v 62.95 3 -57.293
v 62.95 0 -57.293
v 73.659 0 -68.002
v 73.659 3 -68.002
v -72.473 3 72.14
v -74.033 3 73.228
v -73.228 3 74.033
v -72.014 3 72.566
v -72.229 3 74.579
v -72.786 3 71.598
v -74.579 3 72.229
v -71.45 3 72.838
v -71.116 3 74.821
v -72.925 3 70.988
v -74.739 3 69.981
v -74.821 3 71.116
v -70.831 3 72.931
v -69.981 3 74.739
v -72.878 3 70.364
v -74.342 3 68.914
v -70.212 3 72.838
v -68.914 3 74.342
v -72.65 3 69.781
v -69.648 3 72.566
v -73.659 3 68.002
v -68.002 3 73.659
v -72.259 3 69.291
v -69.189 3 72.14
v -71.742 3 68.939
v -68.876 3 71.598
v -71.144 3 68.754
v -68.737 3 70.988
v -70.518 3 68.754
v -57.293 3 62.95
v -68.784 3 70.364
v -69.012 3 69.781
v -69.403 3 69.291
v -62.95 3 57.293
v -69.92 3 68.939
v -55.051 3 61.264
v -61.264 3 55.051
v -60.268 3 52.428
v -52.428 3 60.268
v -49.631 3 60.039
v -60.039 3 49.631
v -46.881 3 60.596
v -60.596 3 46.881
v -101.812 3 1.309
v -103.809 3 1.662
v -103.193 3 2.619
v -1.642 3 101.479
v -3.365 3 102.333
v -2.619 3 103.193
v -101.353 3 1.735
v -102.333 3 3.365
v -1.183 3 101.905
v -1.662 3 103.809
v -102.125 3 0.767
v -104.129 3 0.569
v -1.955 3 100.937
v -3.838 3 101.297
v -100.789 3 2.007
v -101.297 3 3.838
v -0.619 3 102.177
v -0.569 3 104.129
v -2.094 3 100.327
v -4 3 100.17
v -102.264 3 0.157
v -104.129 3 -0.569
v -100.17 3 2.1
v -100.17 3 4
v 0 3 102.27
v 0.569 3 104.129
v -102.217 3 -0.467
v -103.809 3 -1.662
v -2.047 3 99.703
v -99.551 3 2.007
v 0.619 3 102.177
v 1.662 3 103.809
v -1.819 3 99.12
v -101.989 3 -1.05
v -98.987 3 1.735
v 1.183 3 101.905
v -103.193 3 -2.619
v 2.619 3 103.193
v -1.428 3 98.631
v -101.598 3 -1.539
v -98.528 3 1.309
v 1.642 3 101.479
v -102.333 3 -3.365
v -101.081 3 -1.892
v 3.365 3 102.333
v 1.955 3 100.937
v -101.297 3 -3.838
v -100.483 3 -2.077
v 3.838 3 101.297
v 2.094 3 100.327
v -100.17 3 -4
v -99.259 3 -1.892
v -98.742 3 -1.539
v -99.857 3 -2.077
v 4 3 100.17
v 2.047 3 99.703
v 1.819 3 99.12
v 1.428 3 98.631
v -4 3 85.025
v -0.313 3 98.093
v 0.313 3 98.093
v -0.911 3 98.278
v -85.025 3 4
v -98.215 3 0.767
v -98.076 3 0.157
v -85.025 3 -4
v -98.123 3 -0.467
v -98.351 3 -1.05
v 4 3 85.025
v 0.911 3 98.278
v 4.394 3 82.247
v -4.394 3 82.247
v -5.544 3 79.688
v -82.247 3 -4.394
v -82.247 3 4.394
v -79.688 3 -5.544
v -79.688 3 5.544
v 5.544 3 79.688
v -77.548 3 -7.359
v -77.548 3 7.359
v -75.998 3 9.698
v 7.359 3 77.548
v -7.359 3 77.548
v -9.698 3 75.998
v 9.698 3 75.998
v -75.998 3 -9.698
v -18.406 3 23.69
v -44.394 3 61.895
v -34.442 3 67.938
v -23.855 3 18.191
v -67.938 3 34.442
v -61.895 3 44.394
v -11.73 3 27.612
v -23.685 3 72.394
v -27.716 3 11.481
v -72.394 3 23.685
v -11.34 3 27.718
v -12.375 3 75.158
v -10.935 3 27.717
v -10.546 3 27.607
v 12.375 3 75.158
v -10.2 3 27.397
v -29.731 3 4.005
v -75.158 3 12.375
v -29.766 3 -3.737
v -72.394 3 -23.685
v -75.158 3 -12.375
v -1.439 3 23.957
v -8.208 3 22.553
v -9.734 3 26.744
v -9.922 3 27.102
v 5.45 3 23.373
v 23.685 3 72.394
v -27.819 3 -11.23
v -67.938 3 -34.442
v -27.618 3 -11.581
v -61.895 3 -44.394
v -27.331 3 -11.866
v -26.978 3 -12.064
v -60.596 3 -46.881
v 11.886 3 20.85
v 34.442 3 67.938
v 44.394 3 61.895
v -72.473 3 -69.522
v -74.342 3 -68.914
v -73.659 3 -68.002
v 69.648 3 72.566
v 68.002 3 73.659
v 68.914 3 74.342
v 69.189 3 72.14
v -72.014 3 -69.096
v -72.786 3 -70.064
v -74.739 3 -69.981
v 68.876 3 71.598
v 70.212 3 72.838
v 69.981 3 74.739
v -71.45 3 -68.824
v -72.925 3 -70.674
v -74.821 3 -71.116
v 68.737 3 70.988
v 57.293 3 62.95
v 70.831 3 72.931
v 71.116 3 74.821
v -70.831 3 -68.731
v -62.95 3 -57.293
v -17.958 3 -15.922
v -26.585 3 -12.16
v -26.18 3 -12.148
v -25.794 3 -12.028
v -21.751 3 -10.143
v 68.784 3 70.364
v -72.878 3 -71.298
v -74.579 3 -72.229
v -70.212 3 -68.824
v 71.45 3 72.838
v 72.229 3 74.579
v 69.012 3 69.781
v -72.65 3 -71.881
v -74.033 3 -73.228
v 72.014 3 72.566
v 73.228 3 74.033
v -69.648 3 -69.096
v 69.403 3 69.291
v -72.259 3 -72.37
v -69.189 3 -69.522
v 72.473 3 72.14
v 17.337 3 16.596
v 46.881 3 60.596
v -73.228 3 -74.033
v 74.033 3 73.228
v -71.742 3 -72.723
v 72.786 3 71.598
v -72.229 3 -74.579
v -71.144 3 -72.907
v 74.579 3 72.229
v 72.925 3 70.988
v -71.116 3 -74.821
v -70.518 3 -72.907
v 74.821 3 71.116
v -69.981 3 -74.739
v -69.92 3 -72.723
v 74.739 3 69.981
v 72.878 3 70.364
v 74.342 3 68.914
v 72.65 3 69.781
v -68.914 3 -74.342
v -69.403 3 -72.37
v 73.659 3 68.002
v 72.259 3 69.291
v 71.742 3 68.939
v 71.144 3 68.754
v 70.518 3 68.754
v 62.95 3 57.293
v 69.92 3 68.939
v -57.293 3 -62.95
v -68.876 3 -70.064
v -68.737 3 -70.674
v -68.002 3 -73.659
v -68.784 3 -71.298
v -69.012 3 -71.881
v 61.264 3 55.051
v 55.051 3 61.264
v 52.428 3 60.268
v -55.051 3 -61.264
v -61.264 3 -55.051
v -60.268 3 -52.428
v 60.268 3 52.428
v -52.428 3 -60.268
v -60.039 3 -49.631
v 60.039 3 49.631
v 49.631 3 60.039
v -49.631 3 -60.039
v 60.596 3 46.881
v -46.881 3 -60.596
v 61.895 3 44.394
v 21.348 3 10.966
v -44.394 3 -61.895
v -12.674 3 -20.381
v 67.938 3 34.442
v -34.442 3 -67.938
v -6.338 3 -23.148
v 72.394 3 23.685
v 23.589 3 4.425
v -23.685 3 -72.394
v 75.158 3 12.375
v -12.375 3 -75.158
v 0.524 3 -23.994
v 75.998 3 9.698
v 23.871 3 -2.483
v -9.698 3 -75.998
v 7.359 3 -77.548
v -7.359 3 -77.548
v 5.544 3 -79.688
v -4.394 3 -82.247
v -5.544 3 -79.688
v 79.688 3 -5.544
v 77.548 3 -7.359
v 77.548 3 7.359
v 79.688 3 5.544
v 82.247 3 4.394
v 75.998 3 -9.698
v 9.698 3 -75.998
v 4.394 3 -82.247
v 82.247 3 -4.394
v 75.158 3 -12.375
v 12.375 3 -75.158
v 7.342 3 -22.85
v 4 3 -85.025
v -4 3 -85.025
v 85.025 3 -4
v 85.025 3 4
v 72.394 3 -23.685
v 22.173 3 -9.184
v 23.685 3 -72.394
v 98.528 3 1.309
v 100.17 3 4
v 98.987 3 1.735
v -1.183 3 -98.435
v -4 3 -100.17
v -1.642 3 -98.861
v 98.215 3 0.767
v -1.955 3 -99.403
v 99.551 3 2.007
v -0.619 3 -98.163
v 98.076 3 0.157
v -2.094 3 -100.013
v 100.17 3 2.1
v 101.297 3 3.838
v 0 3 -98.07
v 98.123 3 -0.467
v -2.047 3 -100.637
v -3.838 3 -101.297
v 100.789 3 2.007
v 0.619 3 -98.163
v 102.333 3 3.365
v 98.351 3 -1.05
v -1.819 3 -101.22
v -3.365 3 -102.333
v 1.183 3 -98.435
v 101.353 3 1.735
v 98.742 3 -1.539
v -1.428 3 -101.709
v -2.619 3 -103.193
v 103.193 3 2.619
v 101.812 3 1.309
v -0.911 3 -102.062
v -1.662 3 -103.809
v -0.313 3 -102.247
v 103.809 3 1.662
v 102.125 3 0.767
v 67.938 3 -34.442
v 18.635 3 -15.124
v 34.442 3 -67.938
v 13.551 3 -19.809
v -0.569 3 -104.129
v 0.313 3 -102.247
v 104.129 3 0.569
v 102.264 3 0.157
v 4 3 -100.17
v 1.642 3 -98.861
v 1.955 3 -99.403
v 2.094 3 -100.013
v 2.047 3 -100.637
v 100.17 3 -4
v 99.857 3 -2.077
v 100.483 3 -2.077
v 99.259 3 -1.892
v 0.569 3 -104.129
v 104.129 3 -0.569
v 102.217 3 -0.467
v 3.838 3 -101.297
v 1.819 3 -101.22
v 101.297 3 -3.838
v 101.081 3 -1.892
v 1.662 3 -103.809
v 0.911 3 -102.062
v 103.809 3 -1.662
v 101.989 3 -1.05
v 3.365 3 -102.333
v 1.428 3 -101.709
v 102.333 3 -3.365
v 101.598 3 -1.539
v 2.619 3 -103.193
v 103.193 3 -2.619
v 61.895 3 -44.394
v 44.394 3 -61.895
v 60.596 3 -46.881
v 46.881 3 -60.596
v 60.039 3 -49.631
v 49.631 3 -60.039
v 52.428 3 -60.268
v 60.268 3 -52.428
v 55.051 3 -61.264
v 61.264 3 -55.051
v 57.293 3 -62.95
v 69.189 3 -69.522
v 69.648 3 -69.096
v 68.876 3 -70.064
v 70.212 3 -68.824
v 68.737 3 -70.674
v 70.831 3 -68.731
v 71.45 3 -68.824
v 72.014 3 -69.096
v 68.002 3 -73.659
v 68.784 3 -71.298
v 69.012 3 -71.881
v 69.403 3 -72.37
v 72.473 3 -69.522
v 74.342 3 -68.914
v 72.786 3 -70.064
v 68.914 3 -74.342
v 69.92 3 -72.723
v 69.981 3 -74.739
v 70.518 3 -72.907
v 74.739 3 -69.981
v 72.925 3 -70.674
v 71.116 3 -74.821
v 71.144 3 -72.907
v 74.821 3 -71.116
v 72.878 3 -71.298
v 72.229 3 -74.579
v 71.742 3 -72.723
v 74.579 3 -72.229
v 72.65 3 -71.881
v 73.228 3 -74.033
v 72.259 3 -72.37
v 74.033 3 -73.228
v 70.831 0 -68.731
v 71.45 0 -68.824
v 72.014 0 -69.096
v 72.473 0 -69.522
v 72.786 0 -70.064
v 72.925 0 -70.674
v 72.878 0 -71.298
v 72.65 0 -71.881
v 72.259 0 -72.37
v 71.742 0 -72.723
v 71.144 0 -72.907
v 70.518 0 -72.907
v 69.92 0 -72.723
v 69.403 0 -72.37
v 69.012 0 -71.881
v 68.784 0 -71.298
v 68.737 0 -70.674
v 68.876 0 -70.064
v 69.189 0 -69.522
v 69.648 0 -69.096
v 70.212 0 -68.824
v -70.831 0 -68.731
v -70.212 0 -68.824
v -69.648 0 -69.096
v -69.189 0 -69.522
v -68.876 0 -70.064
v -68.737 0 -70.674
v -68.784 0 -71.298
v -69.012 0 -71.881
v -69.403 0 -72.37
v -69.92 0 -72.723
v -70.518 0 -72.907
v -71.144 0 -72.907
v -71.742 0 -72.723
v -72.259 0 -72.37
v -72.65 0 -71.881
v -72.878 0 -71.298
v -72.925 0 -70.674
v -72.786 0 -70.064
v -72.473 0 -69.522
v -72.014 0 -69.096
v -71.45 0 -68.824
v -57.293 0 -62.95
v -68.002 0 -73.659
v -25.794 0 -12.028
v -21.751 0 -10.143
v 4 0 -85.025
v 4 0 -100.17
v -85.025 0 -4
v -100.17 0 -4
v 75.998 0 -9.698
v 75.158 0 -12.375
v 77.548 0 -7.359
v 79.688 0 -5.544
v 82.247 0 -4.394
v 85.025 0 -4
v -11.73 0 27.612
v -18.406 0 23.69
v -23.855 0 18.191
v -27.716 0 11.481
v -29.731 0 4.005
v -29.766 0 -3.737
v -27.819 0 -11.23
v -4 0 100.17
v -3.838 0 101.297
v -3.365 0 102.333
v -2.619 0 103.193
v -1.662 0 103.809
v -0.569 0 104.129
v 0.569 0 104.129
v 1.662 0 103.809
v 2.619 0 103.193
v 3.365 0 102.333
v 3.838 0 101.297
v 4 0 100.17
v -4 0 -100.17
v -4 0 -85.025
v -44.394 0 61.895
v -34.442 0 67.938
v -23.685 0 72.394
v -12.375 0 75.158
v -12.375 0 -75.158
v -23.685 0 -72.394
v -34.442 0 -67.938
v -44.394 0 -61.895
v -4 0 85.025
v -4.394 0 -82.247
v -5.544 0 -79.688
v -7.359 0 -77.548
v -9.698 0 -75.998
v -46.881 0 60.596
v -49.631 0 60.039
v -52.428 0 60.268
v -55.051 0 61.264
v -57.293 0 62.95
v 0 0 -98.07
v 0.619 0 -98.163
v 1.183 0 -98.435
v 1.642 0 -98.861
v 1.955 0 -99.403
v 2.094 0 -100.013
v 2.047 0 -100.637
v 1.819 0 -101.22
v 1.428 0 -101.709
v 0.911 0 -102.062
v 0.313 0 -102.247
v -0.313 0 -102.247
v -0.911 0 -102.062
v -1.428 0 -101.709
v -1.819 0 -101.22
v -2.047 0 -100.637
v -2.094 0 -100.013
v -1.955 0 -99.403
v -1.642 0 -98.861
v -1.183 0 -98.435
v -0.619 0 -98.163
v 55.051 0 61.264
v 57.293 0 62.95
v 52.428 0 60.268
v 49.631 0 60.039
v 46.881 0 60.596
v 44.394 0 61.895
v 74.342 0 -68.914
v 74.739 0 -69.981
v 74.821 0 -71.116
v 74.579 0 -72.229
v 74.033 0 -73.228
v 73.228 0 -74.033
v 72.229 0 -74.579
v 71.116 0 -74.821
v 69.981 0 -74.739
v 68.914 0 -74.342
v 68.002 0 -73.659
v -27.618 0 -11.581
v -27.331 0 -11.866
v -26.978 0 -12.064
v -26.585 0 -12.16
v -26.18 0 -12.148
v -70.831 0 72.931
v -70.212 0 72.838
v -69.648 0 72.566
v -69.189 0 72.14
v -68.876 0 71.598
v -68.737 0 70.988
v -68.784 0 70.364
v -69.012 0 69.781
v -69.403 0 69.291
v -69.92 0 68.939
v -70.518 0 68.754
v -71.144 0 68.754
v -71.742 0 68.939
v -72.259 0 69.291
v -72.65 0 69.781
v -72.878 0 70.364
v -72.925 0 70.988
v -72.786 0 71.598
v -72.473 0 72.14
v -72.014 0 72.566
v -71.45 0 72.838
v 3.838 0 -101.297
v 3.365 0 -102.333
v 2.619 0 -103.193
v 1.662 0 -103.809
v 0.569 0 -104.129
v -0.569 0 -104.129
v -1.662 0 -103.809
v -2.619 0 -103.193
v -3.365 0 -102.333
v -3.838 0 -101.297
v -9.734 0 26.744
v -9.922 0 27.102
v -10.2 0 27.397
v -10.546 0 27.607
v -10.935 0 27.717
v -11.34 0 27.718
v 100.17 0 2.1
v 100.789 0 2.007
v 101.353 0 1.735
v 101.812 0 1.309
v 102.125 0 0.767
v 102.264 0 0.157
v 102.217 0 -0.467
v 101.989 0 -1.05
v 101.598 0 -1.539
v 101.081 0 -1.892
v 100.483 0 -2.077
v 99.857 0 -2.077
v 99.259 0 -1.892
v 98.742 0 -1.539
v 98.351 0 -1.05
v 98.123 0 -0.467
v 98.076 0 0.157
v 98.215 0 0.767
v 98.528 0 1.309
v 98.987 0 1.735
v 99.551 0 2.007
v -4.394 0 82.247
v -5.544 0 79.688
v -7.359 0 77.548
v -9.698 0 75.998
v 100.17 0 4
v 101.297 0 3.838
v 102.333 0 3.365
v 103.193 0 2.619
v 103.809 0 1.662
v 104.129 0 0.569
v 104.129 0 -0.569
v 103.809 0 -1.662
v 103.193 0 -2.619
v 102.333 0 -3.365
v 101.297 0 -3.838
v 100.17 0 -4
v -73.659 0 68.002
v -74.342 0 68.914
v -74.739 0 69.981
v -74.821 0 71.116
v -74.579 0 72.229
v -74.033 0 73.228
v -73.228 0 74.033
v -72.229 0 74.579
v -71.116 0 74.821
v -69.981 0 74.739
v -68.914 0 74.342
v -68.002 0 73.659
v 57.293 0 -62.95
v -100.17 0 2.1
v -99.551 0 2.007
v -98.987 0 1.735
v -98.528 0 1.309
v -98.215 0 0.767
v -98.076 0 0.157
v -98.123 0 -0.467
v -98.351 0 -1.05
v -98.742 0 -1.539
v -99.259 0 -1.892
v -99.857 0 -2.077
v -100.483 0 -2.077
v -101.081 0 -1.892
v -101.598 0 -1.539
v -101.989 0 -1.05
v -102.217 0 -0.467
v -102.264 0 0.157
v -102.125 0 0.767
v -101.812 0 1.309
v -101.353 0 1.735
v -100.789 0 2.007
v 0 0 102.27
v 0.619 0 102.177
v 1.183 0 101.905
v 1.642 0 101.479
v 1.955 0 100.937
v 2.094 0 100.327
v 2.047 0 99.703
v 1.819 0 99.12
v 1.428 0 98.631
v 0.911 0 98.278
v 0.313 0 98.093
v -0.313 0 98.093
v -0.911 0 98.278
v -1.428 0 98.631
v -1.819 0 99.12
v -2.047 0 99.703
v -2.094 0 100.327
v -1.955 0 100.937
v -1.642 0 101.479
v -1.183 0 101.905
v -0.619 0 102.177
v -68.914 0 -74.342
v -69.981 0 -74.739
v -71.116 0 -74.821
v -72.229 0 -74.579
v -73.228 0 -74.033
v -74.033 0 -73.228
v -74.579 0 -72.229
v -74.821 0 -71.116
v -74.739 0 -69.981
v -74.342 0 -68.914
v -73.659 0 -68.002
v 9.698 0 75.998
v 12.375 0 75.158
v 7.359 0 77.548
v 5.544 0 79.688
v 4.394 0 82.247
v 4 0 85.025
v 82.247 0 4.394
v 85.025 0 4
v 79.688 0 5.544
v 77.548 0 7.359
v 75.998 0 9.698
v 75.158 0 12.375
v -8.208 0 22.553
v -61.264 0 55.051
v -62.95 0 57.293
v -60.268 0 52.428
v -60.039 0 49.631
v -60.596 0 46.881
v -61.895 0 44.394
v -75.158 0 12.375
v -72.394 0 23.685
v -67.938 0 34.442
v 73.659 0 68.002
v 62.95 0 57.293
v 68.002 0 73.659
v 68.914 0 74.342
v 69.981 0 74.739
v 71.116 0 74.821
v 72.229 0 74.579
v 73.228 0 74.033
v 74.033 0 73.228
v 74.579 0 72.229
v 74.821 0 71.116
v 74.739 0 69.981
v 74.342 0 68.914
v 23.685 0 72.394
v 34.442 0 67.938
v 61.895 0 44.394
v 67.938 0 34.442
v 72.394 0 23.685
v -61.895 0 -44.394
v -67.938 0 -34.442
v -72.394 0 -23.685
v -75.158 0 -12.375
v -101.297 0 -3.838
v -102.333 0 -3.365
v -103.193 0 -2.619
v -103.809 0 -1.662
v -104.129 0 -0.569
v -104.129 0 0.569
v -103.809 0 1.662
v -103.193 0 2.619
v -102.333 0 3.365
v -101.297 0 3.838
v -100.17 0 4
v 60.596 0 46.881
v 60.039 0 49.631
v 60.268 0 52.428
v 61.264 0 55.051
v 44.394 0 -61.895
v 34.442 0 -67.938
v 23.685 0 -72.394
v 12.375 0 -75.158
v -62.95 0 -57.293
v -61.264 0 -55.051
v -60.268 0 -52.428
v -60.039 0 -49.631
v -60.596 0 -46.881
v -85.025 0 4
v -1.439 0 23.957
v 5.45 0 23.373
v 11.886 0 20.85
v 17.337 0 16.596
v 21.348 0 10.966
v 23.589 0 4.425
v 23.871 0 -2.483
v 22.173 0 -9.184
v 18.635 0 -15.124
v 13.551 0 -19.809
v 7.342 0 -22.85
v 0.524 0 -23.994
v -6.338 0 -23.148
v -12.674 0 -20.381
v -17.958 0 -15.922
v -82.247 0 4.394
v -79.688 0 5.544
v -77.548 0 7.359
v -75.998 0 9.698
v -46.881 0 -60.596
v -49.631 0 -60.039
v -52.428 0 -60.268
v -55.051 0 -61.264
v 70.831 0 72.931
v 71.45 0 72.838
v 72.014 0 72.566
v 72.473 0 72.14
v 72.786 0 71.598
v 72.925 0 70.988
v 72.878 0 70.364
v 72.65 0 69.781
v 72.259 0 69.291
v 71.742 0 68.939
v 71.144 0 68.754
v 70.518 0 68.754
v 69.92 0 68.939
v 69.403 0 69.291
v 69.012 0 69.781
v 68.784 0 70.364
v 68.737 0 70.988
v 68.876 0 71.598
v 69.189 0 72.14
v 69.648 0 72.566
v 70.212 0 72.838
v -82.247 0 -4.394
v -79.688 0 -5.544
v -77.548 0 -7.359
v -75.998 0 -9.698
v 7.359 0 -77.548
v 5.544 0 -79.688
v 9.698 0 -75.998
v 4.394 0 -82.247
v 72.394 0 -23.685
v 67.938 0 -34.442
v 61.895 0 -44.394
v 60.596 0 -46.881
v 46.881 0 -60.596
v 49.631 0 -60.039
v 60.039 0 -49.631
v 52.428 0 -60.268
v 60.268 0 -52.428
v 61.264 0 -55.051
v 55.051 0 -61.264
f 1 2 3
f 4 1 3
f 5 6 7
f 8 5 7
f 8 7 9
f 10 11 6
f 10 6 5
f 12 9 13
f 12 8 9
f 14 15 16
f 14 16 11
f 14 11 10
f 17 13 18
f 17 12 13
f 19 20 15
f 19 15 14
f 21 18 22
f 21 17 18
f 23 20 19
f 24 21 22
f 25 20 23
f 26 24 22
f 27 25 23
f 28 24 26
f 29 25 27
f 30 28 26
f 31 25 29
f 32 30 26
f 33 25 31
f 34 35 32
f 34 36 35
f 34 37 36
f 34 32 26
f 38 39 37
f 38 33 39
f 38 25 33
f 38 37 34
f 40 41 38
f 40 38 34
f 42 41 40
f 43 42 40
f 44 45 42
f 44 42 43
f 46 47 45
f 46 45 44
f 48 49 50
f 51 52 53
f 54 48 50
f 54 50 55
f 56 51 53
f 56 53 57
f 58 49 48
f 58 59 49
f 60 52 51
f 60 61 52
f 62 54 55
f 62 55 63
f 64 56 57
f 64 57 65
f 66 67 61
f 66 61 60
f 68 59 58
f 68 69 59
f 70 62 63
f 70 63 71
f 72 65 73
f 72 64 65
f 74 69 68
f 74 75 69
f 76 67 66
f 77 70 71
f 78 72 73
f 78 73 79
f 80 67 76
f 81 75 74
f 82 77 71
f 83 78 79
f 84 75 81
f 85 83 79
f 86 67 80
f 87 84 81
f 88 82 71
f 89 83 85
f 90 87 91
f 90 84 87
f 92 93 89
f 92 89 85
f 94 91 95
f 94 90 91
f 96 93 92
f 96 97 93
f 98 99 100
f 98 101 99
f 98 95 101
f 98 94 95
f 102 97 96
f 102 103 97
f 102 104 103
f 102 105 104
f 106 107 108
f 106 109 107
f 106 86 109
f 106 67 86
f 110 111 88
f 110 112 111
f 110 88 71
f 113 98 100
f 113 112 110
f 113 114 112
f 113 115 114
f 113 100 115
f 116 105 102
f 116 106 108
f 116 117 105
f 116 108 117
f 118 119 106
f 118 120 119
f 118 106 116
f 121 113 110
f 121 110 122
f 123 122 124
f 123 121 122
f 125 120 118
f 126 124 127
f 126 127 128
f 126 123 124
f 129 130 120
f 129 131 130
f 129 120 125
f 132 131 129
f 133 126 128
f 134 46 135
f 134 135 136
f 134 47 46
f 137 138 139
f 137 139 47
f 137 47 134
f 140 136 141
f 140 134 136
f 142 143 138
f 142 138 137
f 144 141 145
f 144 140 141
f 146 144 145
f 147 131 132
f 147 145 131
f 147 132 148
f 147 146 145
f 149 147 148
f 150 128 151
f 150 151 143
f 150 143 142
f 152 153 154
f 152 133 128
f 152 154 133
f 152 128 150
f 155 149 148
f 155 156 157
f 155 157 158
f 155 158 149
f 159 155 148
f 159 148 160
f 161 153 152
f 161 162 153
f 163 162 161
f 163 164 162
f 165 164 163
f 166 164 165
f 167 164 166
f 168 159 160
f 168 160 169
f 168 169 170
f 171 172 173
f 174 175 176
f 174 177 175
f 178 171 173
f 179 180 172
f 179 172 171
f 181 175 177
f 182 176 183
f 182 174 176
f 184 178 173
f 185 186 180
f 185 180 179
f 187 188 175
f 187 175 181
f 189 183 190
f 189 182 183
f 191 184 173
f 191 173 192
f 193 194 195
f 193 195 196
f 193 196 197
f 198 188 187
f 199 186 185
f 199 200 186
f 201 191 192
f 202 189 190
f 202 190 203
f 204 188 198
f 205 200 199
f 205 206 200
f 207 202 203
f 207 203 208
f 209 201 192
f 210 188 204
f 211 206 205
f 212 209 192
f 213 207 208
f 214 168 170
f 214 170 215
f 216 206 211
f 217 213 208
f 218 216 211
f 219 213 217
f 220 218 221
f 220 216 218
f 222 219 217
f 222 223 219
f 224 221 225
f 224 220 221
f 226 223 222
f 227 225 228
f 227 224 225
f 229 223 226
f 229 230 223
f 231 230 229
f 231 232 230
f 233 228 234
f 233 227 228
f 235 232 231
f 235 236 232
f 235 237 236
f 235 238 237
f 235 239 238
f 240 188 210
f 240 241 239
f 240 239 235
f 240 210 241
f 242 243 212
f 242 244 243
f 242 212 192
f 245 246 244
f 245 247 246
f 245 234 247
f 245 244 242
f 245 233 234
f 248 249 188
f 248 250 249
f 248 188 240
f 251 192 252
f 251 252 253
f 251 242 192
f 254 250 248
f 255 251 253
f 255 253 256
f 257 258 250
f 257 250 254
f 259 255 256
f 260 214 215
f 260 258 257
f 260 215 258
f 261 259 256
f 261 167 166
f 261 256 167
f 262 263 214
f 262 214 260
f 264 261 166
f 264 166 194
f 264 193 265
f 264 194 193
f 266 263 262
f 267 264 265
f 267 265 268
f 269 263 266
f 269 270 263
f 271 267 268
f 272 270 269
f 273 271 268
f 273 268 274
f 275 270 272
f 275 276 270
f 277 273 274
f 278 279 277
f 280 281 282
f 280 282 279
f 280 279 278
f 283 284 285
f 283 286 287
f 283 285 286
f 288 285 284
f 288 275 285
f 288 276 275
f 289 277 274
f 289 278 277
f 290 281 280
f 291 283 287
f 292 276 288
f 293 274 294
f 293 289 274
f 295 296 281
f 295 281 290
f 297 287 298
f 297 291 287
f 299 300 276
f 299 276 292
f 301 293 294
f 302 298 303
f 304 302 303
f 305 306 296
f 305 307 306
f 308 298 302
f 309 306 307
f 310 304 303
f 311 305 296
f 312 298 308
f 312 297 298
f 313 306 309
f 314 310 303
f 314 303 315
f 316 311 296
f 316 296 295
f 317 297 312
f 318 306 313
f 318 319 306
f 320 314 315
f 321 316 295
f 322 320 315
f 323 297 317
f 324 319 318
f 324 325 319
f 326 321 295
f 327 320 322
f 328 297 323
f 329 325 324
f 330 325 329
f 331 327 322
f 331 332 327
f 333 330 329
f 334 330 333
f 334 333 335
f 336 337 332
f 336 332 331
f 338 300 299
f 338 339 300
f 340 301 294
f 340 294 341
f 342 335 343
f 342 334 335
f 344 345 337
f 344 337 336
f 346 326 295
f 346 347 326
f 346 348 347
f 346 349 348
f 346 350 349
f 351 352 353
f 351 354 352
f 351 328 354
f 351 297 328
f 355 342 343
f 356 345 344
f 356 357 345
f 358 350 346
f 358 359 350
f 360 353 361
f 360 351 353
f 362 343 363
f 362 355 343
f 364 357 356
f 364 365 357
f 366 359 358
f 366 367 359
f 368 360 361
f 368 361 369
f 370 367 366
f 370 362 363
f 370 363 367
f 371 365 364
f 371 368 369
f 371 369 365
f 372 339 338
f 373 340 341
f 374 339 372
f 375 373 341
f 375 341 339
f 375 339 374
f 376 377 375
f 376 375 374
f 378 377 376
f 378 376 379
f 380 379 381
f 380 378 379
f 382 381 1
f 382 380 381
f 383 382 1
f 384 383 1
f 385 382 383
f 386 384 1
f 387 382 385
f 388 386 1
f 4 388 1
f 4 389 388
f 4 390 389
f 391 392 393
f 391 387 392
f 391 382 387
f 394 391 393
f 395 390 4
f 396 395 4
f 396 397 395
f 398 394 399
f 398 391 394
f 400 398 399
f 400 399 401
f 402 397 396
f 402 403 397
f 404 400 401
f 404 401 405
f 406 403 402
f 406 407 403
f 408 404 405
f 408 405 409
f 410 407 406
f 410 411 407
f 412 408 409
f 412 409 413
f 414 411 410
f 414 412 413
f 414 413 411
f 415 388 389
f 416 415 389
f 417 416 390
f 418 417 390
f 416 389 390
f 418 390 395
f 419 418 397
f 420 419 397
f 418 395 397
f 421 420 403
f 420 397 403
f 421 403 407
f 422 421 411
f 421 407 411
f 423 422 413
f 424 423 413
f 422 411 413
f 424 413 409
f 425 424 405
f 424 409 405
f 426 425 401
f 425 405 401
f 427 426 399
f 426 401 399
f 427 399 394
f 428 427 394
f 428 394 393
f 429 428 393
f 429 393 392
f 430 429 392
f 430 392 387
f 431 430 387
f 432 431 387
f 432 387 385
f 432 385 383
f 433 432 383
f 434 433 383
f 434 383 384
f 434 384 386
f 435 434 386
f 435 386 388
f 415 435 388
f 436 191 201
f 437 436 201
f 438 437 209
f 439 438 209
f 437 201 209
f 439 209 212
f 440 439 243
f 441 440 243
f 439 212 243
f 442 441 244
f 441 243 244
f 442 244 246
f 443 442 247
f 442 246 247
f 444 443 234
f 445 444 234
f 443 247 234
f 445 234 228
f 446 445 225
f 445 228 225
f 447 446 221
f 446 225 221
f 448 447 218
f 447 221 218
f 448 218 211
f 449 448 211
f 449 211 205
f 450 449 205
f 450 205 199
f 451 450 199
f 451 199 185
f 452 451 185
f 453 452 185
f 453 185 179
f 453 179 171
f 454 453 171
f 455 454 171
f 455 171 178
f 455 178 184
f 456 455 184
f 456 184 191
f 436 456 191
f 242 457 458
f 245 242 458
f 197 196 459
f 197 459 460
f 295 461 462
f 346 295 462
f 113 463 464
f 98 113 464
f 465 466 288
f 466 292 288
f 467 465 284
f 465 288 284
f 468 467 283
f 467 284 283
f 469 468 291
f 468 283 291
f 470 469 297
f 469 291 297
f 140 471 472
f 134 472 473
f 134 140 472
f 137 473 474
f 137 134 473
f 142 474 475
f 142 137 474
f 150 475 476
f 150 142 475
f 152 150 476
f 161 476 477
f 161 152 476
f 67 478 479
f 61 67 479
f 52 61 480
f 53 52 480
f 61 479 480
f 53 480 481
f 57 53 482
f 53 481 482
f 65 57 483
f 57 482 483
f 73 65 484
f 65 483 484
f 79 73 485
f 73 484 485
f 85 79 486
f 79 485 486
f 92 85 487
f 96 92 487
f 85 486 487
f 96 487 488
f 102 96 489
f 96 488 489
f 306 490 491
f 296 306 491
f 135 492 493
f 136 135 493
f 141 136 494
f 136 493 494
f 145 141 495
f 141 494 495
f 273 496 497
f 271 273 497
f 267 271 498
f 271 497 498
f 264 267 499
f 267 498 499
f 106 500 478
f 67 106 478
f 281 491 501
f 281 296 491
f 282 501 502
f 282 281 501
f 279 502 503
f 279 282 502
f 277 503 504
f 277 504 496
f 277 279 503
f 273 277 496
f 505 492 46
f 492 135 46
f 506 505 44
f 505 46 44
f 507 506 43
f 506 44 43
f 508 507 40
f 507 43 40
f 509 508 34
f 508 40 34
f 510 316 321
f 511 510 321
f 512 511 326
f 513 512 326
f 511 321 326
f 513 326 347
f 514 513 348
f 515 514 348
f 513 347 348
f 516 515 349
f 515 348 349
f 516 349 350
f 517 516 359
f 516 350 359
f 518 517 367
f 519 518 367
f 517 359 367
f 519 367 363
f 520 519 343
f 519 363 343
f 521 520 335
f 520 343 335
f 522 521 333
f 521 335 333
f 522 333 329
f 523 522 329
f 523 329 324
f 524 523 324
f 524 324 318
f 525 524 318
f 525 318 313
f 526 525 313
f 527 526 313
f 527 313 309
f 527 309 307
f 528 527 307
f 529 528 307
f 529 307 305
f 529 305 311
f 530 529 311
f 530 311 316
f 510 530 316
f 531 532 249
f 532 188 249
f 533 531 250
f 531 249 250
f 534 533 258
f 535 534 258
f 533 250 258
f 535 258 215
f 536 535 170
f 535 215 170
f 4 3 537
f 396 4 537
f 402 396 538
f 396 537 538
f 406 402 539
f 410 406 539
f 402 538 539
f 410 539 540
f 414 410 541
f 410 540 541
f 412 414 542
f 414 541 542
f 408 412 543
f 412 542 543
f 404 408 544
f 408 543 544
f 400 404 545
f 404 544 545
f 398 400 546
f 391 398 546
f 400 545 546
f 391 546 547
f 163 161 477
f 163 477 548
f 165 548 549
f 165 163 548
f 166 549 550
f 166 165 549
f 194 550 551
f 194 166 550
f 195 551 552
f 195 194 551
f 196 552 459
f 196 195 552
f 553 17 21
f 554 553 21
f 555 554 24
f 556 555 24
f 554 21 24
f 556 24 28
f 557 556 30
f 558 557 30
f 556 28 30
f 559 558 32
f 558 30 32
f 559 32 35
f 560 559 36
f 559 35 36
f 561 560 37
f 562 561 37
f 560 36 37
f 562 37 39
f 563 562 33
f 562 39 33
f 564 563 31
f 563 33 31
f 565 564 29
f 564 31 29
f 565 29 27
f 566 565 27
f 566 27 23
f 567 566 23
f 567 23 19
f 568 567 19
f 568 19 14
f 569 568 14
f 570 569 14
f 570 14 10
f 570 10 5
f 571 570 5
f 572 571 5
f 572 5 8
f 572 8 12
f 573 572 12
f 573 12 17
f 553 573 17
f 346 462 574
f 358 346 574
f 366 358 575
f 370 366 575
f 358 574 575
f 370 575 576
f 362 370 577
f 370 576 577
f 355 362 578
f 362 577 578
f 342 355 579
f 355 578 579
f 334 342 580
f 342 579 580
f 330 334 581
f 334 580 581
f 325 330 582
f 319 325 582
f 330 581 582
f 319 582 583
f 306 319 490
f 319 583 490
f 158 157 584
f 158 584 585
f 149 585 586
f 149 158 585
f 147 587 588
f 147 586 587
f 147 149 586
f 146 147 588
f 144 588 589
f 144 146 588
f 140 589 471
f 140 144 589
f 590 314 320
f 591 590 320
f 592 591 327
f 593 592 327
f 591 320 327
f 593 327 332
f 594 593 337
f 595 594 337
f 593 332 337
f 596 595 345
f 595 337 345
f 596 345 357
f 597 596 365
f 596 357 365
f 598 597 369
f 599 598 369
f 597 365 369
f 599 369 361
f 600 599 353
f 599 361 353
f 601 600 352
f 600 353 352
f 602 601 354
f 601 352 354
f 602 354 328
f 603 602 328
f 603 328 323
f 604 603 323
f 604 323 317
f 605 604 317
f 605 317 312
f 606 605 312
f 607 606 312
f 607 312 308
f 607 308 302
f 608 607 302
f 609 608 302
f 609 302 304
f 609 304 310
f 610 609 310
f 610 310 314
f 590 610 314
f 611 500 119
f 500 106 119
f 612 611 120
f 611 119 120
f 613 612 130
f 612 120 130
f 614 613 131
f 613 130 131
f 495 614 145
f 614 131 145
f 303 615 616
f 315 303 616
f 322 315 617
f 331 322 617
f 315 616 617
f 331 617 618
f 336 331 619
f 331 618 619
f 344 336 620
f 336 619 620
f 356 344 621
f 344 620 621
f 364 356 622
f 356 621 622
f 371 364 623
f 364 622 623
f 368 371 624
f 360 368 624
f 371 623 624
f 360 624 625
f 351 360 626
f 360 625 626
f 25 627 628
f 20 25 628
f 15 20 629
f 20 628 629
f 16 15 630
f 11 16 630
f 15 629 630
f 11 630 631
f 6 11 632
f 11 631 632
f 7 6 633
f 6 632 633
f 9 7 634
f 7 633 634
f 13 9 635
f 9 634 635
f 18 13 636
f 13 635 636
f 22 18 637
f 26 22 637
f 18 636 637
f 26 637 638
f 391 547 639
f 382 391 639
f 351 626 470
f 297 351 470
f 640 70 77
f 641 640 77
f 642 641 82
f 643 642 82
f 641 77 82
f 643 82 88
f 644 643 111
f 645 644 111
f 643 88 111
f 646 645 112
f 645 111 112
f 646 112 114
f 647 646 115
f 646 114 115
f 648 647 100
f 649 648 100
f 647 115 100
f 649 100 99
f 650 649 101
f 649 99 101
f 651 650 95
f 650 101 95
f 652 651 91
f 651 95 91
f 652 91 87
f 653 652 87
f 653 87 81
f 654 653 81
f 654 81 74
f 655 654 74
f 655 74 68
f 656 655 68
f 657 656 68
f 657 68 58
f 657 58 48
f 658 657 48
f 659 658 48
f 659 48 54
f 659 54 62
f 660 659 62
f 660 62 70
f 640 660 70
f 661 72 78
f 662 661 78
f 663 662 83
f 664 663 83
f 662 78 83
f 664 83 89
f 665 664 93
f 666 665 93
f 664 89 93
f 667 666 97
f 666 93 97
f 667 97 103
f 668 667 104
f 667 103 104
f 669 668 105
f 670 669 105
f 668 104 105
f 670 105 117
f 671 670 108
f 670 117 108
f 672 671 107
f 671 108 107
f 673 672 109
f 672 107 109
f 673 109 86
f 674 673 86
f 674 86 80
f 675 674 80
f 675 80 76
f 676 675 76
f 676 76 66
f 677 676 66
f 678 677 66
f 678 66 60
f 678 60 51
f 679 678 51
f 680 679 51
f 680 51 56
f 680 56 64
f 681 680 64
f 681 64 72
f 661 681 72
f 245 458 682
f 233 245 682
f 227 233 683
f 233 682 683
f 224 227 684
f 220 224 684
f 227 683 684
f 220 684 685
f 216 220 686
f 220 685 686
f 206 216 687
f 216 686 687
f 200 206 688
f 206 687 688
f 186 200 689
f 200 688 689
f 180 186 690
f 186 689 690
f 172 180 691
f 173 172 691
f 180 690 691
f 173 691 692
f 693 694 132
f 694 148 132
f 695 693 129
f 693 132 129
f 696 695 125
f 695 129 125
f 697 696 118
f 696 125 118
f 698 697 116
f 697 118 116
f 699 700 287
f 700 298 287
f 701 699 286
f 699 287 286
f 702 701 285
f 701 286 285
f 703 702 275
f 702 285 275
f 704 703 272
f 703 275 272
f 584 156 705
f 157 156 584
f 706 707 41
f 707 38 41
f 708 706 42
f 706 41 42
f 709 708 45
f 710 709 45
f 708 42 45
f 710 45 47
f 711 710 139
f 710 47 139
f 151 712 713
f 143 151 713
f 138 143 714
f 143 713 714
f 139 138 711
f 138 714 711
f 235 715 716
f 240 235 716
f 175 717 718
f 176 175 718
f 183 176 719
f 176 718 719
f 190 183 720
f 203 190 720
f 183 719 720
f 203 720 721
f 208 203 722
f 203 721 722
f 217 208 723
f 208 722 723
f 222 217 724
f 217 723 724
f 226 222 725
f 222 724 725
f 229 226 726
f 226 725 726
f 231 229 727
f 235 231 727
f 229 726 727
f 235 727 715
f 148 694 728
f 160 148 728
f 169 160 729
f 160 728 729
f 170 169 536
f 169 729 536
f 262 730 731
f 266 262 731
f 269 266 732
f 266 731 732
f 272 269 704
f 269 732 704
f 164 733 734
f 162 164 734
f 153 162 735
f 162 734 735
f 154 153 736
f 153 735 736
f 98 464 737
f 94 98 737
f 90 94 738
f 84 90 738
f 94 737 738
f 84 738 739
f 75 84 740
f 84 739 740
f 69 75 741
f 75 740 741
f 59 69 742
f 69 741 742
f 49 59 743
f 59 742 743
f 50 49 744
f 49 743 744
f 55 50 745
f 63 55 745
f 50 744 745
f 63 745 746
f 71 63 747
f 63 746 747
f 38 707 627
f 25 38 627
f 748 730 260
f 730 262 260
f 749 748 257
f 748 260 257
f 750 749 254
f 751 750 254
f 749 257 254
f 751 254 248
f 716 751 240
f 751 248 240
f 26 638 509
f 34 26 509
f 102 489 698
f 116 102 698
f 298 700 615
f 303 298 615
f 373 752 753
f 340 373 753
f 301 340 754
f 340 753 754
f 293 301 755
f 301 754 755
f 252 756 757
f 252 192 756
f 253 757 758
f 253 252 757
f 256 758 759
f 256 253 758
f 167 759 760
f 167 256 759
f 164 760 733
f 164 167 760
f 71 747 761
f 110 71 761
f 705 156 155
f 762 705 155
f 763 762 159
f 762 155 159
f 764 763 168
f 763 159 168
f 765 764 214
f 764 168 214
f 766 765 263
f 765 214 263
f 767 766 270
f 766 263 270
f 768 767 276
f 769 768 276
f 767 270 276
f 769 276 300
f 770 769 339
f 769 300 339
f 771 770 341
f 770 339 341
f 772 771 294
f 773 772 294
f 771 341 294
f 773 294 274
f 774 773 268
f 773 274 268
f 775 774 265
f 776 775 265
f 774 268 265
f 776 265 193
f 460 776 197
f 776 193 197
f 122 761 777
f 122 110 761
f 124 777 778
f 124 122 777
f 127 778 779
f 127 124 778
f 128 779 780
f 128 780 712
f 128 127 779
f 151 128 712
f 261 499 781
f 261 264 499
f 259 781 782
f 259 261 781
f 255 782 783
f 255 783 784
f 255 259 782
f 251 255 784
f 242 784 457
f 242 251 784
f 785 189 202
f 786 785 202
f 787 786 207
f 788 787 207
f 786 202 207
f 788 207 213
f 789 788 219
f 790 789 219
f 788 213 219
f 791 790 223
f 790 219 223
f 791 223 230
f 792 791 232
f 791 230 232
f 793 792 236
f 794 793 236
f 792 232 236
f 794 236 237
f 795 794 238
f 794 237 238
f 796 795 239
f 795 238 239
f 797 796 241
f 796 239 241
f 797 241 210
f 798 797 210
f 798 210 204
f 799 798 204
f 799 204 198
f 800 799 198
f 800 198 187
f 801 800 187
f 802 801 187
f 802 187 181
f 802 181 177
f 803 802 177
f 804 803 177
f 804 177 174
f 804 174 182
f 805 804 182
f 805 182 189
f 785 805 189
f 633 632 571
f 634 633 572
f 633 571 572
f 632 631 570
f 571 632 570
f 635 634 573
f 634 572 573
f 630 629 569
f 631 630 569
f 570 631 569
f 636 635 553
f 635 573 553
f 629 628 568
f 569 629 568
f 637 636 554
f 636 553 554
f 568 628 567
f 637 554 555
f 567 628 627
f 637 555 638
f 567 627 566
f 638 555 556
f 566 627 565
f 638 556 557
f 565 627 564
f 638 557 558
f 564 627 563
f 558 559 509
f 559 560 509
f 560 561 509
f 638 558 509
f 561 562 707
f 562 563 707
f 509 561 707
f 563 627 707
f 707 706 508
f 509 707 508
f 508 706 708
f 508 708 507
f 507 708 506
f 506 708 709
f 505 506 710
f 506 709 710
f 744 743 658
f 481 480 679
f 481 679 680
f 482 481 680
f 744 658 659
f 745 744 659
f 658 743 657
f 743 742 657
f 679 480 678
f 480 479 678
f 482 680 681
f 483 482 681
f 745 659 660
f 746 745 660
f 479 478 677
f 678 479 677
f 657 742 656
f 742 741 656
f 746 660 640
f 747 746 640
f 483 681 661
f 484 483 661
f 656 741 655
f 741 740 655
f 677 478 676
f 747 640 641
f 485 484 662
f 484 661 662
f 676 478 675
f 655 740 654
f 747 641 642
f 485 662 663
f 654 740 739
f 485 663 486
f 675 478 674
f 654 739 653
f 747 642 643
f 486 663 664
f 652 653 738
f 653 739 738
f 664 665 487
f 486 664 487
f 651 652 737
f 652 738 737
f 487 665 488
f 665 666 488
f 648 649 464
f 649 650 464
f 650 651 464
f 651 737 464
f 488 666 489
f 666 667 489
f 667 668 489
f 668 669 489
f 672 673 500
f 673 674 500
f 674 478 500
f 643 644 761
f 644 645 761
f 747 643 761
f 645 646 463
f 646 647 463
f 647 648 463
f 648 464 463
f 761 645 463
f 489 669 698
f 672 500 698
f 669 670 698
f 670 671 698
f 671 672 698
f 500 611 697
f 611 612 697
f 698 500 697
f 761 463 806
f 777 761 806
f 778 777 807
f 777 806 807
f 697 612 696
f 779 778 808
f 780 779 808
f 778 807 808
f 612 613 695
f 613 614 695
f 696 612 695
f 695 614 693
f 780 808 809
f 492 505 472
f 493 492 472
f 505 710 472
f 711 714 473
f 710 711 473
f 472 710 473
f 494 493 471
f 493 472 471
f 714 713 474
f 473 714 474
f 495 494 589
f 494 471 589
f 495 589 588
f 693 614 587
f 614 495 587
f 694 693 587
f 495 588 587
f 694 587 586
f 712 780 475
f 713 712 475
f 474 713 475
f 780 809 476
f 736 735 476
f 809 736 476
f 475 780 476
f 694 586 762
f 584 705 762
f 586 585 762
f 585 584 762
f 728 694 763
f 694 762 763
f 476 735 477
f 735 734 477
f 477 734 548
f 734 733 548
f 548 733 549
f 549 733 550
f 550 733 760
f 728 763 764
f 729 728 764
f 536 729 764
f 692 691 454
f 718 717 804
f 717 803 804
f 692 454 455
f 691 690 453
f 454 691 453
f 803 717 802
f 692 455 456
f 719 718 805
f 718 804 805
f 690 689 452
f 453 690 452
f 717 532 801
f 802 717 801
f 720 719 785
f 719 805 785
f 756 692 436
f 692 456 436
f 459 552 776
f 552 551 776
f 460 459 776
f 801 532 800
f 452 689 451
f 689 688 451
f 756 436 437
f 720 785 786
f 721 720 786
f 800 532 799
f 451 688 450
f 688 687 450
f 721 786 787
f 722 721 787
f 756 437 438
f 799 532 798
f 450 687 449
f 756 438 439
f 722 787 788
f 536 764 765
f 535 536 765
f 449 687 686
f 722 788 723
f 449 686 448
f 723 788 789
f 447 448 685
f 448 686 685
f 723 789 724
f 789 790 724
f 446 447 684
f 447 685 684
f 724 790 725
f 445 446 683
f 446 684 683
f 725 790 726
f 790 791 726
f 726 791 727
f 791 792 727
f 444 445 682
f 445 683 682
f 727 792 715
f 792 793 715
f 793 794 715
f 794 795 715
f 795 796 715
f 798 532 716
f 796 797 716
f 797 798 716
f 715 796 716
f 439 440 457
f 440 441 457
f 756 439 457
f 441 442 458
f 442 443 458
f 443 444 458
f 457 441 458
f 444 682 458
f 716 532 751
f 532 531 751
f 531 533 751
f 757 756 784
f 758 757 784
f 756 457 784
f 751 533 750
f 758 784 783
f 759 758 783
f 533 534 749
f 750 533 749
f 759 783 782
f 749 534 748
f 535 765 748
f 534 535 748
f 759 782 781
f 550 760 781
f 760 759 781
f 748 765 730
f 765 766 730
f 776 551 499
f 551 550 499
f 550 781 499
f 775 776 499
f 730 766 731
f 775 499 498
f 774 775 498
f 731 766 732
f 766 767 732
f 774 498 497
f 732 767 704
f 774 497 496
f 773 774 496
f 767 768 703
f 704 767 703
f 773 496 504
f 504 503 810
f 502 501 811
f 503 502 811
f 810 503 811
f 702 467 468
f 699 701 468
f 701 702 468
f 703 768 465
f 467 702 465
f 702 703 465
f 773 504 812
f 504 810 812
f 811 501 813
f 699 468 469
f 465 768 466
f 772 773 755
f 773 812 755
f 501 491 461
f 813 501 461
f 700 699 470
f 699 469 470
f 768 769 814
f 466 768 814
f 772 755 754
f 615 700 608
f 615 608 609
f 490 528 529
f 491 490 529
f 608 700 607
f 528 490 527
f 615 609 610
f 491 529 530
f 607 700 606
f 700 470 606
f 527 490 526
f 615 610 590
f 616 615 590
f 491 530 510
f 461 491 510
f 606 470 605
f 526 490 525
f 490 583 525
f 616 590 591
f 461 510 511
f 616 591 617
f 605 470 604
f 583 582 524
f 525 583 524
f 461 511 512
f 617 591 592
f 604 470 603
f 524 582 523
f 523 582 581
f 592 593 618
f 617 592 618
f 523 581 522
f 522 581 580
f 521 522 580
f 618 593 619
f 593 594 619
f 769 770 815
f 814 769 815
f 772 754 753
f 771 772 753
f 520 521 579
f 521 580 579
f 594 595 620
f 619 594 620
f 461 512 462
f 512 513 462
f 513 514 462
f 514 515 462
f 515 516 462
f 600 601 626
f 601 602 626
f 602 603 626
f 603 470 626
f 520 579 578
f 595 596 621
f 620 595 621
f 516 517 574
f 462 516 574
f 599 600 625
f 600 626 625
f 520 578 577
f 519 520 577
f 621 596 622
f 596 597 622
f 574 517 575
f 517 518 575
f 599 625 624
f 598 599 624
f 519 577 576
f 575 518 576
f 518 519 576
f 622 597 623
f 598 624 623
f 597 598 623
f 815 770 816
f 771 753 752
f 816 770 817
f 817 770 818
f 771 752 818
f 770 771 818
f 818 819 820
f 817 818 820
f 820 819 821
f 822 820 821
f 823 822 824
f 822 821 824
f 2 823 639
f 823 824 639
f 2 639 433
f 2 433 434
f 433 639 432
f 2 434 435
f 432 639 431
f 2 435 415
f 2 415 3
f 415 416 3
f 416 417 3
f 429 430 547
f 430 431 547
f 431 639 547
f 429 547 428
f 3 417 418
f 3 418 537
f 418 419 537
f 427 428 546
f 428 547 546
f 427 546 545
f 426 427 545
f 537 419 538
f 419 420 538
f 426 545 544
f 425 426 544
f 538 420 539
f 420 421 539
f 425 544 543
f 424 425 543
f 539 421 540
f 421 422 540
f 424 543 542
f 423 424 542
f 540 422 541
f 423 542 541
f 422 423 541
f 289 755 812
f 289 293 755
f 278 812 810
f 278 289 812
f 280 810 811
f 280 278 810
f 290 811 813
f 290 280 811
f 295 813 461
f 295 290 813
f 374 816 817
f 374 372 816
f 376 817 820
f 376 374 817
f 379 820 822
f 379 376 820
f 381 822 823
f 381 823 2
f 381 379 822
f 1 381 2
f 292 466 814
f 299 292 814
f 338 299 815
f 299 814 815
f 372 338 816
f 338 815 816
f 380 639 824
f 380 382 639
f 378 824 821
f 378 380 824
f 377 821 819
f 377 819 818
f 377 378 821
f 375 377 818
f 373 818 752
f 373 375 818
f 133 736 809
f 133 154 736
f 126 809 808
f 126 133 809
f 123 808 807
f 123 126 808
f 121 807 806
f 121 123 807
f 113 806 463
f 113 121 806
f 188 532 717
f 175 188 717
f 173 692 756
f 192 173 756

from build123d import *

# Parameters (mm, degrees)
BOSS_EXTRUDE1_DEPTH = 3
SKETCH3_R           = 2.1
CUT_EXTRUDE1_DEPTH  = 5
FILLET1_R           = 10
SKETCH4_R           = 24
CUT_EXTRUDE2_DEPTH  = 10


with BuildPart() as part:
    # Sketch1 → Boss-Extrude1 (new body)
    with BuildSketch(Plane(origin=(0, 0, 0), x_dir=(1, 0, 0), z_dir=(0, 1, 0))):
        with BuildLine():
            ThreePointArc((36.740234303, -4), (32.740234303, 0), (36.740234303, 4))
            Line((36.740234303, 4), (76.064899264, 4))
            ThreePointArc((76.064899264, 4), (70.371903991, 29.148997043), (56.614433204, 50.957578955))
            Line((56.614433204, 50.957578955), (28.807695942, 23.150841693))
            ThreePointArc((28.807695942, 23.150841693), (23.150841693, 23.150841693), (23.150841693, 28.807695942))
            Line((23.150841693, 28.807695942), (50.957578955, 56.614433204))
            ThreePointArc((50.957578955, 56.614433204), (29.148997043, 70.371903991), (4, 76.064899264))
            Line((4, 76.064899264), (4, 36.740234303))
            ThreePointArc((4, 36.740234303), (0, 32.740234303), (-4, 36.740234303))
            Line((-4, 36.740234303), (-4, 76.064899264))
            ThreePointArc((-4, 76.064899264), (-29.148997043, 70.371903991), (-50.957578955, 56.614433204))
            Line((-50.957578955, 56.614433204), (-23.150841693, 28.807695942))
            ThreePointArc((-23.150841693, 28.807695942), (-23.150841693, 23.150841693), (-28.807695942, 23.150841693))
            Line((-28.807695942, 23.150841693), (-56.614433204, 50.957578955))
            ThreePointArc((-56.614433204, 50.957578955), (-70.371903991, 29.148997043), (-76.064899264, 4))
            Line((-76.064899264, 4), (-36.740234303, 4))
            ThreePointArc((-36.740234303, 4), (-32.740234303, 0), (-36.740234303, -4))
            Line((-36.740234303, -4), (-76.064899264, -4))
            ThreePointArc((-76.064899264, -4), (-70.371903991, -29.148997043), (-56.614433204, -50.957578955))
            Line((-56.614433204, -50.957578955), (-28.807695942, -23.150841693))
            ThreePointArc((-28.807695942, -23.150841693), (-23.150841693, -23.150841693), (-23.150841693, -28.807695942))
            Line((-23.150841693, -28.807695942), (-50.957578955, -56.614433204))
            ThreePointArc((-50.957578955, -56.614433204), (-29.148997043, -70.371903991), (-4, -76.064899264))
            Line((-4, -76.064899264), (-4, -36.740234303))
            ThreePointArc((-4, -36.740234303), (0, -32.740234303), (4, -36.740234303))
            Line((4, -36.740234303), (4, -76.064899264))
            ThreePointArc((4, -76.064899264), (29.148997043, -70.371903991), (50.957578955, -56.614433204))
            Line((50.957578955, -56.614433204), (23.150841693, -28.807695942))
            ThreePointArc((23.150841693, -28.807695942), (23.150841693, -23.150841693), (28.807695942, -23.150841693))
            Line((28.807695942, -23.150841693), (56.614433204, -50.957578955))
            ThreePointArc((56.614433204, -50.957578955), (70.371903991, -29.148997043), (76.064899264, -4))
            Line((76.064899264, -4), (36.740234303, -4))
        make_face()
        with BuildLine():
            ThreePointArc((-4, 76.064899264), (0, 76.17), (4, 76.064899264))
            Line((4, 76.064899264), (4, 100.17))
            ThreePointArc((4, 100.17), (0, 104.17), (-4, 100.17))
            Line((-4, 100.17), (-4, 76.064899264))
        make_face()
        with BuildLine():
            Line((4, 36.740234303), (4, 76.064899264))
            ThreePointArc((4, 76.064899264), (0, 76.17), (-4, 76.064899264))
            Line((-4, 76.064899264), (-4, 36.740234303))
            ThreePointArc((-4, 36.740234303), (0, 32.740234303), (4, 36.740234303))
        make_face()
        with BuildLine():
            ThreePointArc((-56.614433204, 50.957578955), (-53.860323523, 53.860323523), (-50.957578955, 56.614433204))
            Line((-50.957578955, 56.614433204), (-68.002459147, 73.659313396))
            ThreePointArc((-68.002459147, 73.659313396), (-73.659313396, 73.659313396), (-73.659313396, 68.002459147))
            Line((-73.659313396, 68.002459147), (-56.614433204, 50.957578955))
        make_face()
        with BuildLine():
            Line((-23.150841693, 28.807695942), (-50.957578955, 56.614433204))
            ThreePointArc((-50.957578955, 56.614433204), (-53.860323523, 53.860323523), (-56.614433204, 50.957578955))
            Line((-56.614433204, 50.957578955), (-28.807695942, 23.150841693))
            ThreePointArc((-28.807695942, 23.150841693), (-23.150841693, 23.150841693), (-23.150841693, 28.807695942))
        make_face()
        with BuildLine():
            ThreePointArc((-76.064899264, -4), (-76.17, 0), (-76.064899264, 4))
            Line((-76.064899264, 4), (-100.17, 4))
            ThreePointArc((-100.17, 4), (-104.17, 0), (-100.17, -4))
            Line((-100.17, -4), (-76.064899264, -4))
        make_face()
        with BuildLine():
            Line((-36.740234303, 4), (-76.064899264, 4))
            ThreePointArc((-76.064899264, 4), (-76.17, 0), (-76.064899264, -4))
            Line((-76.064899264, -4), (-36.740234303, -4))
            ThreePointArc((-36.740234303, -4), (-32.740234303, 0), (-36.740234303, 4))
        make_face()
        with BuildLine():
            Line((-68.002459147, -73.659313396), (-50.957578955, -56.614433204))
            ThreePointArc((-50.957578955, -56.614433204), (-53.860323523, -53.860323523), (-56.614433204, -50.957578955))
            Line((-56.614433204, -50.957578955), (-73.659313396, -68.002459147))
            ThreePointArc((-73.659313396, -68.002459147), (-73.659313396, -73.659313396), (-68.002459147, -73.659313396))
        make_face()
        with BuildLine():
            ThreePointArc((-56.614433204, -50.957578955), (-53.860323523, -53.860323523), (-50.957578955, -56.614433204))
            Line((-50.957578955, -56.614433204), (-23.150841693, -28.807695942))
            ThreePointArc((-23.150841693, -28.807695942), (-23.150841693, -23.150841693), (-28.807695942, -23.150841693))
            Line((-28.807695942, -23.150841693), (-56.614433204, -50.957578955))
        make_face()
        with BuildLine():
            ThreePointArc((-4, -76.064899264), (0, -76.17), (4, -76.064899264))
            Line((4, -76.064899264), (4, -36.740234303))
            ThreePointArc((4, -36.740234303), (0, -32.740234303), (-4, -36.740234303))
            Line((-4, -36.740234303), (-4, -76.064899264))
        make_face()
        with BuildLine():
            Line((4, -100.17), (4, -76.064899264))
            ThreePointArc((4, -76.064899264), (0, -76.17), (-4, -76.064899264))
            Line((-4, -76.064899264), (-4, -100.17))
            ThreePointArc((-4, -100.17), (0, -104.17), (4, -100.17))
        make_face()
        with BuildLine():
            ThreePointArc((50.957578955, -56.614433204), (53.860323523, -53.860323523), (56.614433204, -50.957578955))
            Line((56.614433204, -50.957578955), (28.807695942, -23.150841693))
            ThreePointArc((28.807695942, -23.150841693), (23.150841693, -23.150841693), (23.150841693, -28.807695942))
            Line((23.150841693, -28.807695942), (50.957578955, -56.614433204))
        make_face()
        with BuildLine():
            Line((73.659313396, -68.002459147), (56.614433204, -50.957578955))
            ThreePointArc((56.614433204, -50.957578955), (53.860323523, -53.860323523), (50.957578955, -56.614433204))
            Line((50.957578955, -56.614433204), (68.002459147, -73.659313396))
            ThreePointArc((68.002459147, -73.659313396), (73.659313396, -73.659313396), (73.659313396, -68.002459147))
        make_face()
        with BuildLine():
            Line((76.064899264, 4), (36.740234303, 4))
            ThreePointArc((36.740234303, 4), (32.740234303, 0), (36.740234303, -4))
            Line((36.740234303, -4), (76.064899264, -4))
            ThreePointArc((76.064899264, -4), (76.143720282, -2.000690266), (76.17, 0))
            ThreePointArc((76.17, 0), (76.143720282, 2.000690266), (76.064899264, 4))
        make_face()
        with BuildLine():
            Line((100.17, 4), (76.064899264, 4))
            ThreePointArc((76.064899264, 4), (76.143720282, 2.000690266), (76.17, 0))
            ThreePointArc((76.17, 0), (76.143720282, -2.000690266), (76.064899264, -4))
            Line((76.064899264, -4), (100.17, -4))
            ThreePointArc((100.17, -4), (104.17, 0), (100.17, 4))
        make_face()
        with BuildLine():
            Line((28.807695942, 23.150841693), (56.614433204, 50.957578955))
            ThreePointArc((56.614433204, 50.957578955), (53.860323523, 53.860323523), (50.957578955, 56.614433204))
            Line((50.957578955, 56.614433204), (23.150841693, 28.807695942))
            ThreePointArc((23.150841693, 28.807695942), (23.150841693, 23.150841693), (28.807695942, 23.150841693))
        make_face()
        with BuildLine():
            ThreePointArc((50.957578955, 56.614433204), (53.860323523, 53.860323523), (56.614433204, 50.957578955))
            Line((56.614433204, 50.957578955), (73.659313396, 68.002459147))
            ThreePointArc((73.659313396, 68.002459147), (73.659313396, 73.659313396), (68.002459147, 73.659313396))
            Line((68.002459147, 73.659313396), (50.957578955, 56.614433204))
        make_face()
    extrude(amount=BOSS_EXTRUDE1_DEPTH)

    # Sketch3 → Cut-Extrude1 (cut)
    with BuildSketch(Plane(origin=(0, 3, 0), x_dir=(1, 0, 0), z_dir=(0, 1, 0))):
        with Locations(Location((100.17, 0, 0), (0, 0, 270))):
            Circle(SKETCH3_R)
        with Locations(Location((70.830886271, -70.830886271, 0), (0, 0, 270))):
            Circle(SKETCH3_R)
        with Locations(Location((0, -100.17, 0), (0, 0, 270))):
            Circle(SKETCH3_R)
        with Locations(Location((-70.830886271, -70.830886271, 0), (0, 0, 270))):
            Circle(SKETCH3_R)
        with Locations(Location((-100.17, 0, 0), (0, 0, 270))):
            Circle(SKETCH3_R)
        with Locations(Location((-70.830886271, 70.830886271, 0), (0, 0, 270))):
            Circle(SKETCH3_R)
        with Locations(Location((0, 100.17, 0), (0, 0, 270))):
            Circle(SKETCH3_R)
        with Locations(Location((70.830886271, 70.830886271, 0), (0, 0, 270))):
            Circle(SKETCH3_R)
    extrude(amount=-CUT_EXTRUDE1_DEPTH, mode=Mode.SUBTRACT)

    # Fillet1
    fillet1_edges = [part.edges().sort_by_distance(p)[0] for p in [
        (76.064899264, 1.5, -4),
        (76.064899264, 1.5, 4),
        (56.614433204, 1.5, 50.957578955),
        (50.957578955, 1.5, 56.614433204),
        (4, 1.5, 76.064899264),
        (-4, 1.5, 76.064899264),
        (-50.957578955, 1.5, 56.614433204),
        (-56.614433204, 1.5, 50.957578955),
        (-76.064899264, 1.5, 4),
        (-76.064899264, 1.5, -4),
        (-56.614433204, 1.5, -50.957578955),
        (-50.957578955, 1.5, -56.614433204),
        (-4, 1.5, -76.064899264),
        (4, 1.5, -76.064899264),
        (50.957578955, 1.5, -56.614433204),
        (56.614433204, 1.5, -50.957578955),
    ]]
    fillet(fillet1_edges, radius=FILLET1_R)

    # Sketch4 → Cut-Extrude2 (cut)
    with BuildSketch(Plane(origin=(0, 3, 0), x_dir=(1, 0, 0), z_dir=(0, 1, 0))):
        Circle(SKETCH4_R)
        with BuildLine():
            Line((-25.793971814, 12.027926591), (0, 0))
            Line((0, 0), (-9.734063927, -26.744120839))
            ThreePointArc((-9.734063927, -26.744120839), (-10.54568287, -27.606769252), (-11.730108272, -27.611674341))
            ThreePointArc((-11.730108272, -27.611674341), (-27.716385975, -11.480502971), (-27.81884127, 11.229963064))
            ThreePointArc((-27.81884127, 11.229963064), (-26.977857614, 12.064009875), (-25.793971814, 12.027926591))
        make_face()
        with BuildLine():
            ThreePointArc((24, 0), (5.194550735, 23.431104171), (-21.751386889, 10.142838282))
            Line((-21.751386889, 10.142838282), (0, 0))
            Line((0, 0), (-8.20848344, -22.552622899))
            ThreePointArc((-8.20848344, -22.552622899), (13.765834472, -19.659649063), (24, 0))
        make_face()
        with BuildLine():
            Line((0, 0), (-21.751386889, 10.142838282))
            ThreePointArc((-21.751386889, 10.142838282), (-22.17310878, -9.184402377), (-8.20848344, -22.552622899))
            Line((-8.20848344, -22.552622899), (0, 0))
        make_face()
    extrude(amount=-CUT_EXTRUDE2_DEPTH, mode=Mode.SUBTRACT)


solid = part.part
